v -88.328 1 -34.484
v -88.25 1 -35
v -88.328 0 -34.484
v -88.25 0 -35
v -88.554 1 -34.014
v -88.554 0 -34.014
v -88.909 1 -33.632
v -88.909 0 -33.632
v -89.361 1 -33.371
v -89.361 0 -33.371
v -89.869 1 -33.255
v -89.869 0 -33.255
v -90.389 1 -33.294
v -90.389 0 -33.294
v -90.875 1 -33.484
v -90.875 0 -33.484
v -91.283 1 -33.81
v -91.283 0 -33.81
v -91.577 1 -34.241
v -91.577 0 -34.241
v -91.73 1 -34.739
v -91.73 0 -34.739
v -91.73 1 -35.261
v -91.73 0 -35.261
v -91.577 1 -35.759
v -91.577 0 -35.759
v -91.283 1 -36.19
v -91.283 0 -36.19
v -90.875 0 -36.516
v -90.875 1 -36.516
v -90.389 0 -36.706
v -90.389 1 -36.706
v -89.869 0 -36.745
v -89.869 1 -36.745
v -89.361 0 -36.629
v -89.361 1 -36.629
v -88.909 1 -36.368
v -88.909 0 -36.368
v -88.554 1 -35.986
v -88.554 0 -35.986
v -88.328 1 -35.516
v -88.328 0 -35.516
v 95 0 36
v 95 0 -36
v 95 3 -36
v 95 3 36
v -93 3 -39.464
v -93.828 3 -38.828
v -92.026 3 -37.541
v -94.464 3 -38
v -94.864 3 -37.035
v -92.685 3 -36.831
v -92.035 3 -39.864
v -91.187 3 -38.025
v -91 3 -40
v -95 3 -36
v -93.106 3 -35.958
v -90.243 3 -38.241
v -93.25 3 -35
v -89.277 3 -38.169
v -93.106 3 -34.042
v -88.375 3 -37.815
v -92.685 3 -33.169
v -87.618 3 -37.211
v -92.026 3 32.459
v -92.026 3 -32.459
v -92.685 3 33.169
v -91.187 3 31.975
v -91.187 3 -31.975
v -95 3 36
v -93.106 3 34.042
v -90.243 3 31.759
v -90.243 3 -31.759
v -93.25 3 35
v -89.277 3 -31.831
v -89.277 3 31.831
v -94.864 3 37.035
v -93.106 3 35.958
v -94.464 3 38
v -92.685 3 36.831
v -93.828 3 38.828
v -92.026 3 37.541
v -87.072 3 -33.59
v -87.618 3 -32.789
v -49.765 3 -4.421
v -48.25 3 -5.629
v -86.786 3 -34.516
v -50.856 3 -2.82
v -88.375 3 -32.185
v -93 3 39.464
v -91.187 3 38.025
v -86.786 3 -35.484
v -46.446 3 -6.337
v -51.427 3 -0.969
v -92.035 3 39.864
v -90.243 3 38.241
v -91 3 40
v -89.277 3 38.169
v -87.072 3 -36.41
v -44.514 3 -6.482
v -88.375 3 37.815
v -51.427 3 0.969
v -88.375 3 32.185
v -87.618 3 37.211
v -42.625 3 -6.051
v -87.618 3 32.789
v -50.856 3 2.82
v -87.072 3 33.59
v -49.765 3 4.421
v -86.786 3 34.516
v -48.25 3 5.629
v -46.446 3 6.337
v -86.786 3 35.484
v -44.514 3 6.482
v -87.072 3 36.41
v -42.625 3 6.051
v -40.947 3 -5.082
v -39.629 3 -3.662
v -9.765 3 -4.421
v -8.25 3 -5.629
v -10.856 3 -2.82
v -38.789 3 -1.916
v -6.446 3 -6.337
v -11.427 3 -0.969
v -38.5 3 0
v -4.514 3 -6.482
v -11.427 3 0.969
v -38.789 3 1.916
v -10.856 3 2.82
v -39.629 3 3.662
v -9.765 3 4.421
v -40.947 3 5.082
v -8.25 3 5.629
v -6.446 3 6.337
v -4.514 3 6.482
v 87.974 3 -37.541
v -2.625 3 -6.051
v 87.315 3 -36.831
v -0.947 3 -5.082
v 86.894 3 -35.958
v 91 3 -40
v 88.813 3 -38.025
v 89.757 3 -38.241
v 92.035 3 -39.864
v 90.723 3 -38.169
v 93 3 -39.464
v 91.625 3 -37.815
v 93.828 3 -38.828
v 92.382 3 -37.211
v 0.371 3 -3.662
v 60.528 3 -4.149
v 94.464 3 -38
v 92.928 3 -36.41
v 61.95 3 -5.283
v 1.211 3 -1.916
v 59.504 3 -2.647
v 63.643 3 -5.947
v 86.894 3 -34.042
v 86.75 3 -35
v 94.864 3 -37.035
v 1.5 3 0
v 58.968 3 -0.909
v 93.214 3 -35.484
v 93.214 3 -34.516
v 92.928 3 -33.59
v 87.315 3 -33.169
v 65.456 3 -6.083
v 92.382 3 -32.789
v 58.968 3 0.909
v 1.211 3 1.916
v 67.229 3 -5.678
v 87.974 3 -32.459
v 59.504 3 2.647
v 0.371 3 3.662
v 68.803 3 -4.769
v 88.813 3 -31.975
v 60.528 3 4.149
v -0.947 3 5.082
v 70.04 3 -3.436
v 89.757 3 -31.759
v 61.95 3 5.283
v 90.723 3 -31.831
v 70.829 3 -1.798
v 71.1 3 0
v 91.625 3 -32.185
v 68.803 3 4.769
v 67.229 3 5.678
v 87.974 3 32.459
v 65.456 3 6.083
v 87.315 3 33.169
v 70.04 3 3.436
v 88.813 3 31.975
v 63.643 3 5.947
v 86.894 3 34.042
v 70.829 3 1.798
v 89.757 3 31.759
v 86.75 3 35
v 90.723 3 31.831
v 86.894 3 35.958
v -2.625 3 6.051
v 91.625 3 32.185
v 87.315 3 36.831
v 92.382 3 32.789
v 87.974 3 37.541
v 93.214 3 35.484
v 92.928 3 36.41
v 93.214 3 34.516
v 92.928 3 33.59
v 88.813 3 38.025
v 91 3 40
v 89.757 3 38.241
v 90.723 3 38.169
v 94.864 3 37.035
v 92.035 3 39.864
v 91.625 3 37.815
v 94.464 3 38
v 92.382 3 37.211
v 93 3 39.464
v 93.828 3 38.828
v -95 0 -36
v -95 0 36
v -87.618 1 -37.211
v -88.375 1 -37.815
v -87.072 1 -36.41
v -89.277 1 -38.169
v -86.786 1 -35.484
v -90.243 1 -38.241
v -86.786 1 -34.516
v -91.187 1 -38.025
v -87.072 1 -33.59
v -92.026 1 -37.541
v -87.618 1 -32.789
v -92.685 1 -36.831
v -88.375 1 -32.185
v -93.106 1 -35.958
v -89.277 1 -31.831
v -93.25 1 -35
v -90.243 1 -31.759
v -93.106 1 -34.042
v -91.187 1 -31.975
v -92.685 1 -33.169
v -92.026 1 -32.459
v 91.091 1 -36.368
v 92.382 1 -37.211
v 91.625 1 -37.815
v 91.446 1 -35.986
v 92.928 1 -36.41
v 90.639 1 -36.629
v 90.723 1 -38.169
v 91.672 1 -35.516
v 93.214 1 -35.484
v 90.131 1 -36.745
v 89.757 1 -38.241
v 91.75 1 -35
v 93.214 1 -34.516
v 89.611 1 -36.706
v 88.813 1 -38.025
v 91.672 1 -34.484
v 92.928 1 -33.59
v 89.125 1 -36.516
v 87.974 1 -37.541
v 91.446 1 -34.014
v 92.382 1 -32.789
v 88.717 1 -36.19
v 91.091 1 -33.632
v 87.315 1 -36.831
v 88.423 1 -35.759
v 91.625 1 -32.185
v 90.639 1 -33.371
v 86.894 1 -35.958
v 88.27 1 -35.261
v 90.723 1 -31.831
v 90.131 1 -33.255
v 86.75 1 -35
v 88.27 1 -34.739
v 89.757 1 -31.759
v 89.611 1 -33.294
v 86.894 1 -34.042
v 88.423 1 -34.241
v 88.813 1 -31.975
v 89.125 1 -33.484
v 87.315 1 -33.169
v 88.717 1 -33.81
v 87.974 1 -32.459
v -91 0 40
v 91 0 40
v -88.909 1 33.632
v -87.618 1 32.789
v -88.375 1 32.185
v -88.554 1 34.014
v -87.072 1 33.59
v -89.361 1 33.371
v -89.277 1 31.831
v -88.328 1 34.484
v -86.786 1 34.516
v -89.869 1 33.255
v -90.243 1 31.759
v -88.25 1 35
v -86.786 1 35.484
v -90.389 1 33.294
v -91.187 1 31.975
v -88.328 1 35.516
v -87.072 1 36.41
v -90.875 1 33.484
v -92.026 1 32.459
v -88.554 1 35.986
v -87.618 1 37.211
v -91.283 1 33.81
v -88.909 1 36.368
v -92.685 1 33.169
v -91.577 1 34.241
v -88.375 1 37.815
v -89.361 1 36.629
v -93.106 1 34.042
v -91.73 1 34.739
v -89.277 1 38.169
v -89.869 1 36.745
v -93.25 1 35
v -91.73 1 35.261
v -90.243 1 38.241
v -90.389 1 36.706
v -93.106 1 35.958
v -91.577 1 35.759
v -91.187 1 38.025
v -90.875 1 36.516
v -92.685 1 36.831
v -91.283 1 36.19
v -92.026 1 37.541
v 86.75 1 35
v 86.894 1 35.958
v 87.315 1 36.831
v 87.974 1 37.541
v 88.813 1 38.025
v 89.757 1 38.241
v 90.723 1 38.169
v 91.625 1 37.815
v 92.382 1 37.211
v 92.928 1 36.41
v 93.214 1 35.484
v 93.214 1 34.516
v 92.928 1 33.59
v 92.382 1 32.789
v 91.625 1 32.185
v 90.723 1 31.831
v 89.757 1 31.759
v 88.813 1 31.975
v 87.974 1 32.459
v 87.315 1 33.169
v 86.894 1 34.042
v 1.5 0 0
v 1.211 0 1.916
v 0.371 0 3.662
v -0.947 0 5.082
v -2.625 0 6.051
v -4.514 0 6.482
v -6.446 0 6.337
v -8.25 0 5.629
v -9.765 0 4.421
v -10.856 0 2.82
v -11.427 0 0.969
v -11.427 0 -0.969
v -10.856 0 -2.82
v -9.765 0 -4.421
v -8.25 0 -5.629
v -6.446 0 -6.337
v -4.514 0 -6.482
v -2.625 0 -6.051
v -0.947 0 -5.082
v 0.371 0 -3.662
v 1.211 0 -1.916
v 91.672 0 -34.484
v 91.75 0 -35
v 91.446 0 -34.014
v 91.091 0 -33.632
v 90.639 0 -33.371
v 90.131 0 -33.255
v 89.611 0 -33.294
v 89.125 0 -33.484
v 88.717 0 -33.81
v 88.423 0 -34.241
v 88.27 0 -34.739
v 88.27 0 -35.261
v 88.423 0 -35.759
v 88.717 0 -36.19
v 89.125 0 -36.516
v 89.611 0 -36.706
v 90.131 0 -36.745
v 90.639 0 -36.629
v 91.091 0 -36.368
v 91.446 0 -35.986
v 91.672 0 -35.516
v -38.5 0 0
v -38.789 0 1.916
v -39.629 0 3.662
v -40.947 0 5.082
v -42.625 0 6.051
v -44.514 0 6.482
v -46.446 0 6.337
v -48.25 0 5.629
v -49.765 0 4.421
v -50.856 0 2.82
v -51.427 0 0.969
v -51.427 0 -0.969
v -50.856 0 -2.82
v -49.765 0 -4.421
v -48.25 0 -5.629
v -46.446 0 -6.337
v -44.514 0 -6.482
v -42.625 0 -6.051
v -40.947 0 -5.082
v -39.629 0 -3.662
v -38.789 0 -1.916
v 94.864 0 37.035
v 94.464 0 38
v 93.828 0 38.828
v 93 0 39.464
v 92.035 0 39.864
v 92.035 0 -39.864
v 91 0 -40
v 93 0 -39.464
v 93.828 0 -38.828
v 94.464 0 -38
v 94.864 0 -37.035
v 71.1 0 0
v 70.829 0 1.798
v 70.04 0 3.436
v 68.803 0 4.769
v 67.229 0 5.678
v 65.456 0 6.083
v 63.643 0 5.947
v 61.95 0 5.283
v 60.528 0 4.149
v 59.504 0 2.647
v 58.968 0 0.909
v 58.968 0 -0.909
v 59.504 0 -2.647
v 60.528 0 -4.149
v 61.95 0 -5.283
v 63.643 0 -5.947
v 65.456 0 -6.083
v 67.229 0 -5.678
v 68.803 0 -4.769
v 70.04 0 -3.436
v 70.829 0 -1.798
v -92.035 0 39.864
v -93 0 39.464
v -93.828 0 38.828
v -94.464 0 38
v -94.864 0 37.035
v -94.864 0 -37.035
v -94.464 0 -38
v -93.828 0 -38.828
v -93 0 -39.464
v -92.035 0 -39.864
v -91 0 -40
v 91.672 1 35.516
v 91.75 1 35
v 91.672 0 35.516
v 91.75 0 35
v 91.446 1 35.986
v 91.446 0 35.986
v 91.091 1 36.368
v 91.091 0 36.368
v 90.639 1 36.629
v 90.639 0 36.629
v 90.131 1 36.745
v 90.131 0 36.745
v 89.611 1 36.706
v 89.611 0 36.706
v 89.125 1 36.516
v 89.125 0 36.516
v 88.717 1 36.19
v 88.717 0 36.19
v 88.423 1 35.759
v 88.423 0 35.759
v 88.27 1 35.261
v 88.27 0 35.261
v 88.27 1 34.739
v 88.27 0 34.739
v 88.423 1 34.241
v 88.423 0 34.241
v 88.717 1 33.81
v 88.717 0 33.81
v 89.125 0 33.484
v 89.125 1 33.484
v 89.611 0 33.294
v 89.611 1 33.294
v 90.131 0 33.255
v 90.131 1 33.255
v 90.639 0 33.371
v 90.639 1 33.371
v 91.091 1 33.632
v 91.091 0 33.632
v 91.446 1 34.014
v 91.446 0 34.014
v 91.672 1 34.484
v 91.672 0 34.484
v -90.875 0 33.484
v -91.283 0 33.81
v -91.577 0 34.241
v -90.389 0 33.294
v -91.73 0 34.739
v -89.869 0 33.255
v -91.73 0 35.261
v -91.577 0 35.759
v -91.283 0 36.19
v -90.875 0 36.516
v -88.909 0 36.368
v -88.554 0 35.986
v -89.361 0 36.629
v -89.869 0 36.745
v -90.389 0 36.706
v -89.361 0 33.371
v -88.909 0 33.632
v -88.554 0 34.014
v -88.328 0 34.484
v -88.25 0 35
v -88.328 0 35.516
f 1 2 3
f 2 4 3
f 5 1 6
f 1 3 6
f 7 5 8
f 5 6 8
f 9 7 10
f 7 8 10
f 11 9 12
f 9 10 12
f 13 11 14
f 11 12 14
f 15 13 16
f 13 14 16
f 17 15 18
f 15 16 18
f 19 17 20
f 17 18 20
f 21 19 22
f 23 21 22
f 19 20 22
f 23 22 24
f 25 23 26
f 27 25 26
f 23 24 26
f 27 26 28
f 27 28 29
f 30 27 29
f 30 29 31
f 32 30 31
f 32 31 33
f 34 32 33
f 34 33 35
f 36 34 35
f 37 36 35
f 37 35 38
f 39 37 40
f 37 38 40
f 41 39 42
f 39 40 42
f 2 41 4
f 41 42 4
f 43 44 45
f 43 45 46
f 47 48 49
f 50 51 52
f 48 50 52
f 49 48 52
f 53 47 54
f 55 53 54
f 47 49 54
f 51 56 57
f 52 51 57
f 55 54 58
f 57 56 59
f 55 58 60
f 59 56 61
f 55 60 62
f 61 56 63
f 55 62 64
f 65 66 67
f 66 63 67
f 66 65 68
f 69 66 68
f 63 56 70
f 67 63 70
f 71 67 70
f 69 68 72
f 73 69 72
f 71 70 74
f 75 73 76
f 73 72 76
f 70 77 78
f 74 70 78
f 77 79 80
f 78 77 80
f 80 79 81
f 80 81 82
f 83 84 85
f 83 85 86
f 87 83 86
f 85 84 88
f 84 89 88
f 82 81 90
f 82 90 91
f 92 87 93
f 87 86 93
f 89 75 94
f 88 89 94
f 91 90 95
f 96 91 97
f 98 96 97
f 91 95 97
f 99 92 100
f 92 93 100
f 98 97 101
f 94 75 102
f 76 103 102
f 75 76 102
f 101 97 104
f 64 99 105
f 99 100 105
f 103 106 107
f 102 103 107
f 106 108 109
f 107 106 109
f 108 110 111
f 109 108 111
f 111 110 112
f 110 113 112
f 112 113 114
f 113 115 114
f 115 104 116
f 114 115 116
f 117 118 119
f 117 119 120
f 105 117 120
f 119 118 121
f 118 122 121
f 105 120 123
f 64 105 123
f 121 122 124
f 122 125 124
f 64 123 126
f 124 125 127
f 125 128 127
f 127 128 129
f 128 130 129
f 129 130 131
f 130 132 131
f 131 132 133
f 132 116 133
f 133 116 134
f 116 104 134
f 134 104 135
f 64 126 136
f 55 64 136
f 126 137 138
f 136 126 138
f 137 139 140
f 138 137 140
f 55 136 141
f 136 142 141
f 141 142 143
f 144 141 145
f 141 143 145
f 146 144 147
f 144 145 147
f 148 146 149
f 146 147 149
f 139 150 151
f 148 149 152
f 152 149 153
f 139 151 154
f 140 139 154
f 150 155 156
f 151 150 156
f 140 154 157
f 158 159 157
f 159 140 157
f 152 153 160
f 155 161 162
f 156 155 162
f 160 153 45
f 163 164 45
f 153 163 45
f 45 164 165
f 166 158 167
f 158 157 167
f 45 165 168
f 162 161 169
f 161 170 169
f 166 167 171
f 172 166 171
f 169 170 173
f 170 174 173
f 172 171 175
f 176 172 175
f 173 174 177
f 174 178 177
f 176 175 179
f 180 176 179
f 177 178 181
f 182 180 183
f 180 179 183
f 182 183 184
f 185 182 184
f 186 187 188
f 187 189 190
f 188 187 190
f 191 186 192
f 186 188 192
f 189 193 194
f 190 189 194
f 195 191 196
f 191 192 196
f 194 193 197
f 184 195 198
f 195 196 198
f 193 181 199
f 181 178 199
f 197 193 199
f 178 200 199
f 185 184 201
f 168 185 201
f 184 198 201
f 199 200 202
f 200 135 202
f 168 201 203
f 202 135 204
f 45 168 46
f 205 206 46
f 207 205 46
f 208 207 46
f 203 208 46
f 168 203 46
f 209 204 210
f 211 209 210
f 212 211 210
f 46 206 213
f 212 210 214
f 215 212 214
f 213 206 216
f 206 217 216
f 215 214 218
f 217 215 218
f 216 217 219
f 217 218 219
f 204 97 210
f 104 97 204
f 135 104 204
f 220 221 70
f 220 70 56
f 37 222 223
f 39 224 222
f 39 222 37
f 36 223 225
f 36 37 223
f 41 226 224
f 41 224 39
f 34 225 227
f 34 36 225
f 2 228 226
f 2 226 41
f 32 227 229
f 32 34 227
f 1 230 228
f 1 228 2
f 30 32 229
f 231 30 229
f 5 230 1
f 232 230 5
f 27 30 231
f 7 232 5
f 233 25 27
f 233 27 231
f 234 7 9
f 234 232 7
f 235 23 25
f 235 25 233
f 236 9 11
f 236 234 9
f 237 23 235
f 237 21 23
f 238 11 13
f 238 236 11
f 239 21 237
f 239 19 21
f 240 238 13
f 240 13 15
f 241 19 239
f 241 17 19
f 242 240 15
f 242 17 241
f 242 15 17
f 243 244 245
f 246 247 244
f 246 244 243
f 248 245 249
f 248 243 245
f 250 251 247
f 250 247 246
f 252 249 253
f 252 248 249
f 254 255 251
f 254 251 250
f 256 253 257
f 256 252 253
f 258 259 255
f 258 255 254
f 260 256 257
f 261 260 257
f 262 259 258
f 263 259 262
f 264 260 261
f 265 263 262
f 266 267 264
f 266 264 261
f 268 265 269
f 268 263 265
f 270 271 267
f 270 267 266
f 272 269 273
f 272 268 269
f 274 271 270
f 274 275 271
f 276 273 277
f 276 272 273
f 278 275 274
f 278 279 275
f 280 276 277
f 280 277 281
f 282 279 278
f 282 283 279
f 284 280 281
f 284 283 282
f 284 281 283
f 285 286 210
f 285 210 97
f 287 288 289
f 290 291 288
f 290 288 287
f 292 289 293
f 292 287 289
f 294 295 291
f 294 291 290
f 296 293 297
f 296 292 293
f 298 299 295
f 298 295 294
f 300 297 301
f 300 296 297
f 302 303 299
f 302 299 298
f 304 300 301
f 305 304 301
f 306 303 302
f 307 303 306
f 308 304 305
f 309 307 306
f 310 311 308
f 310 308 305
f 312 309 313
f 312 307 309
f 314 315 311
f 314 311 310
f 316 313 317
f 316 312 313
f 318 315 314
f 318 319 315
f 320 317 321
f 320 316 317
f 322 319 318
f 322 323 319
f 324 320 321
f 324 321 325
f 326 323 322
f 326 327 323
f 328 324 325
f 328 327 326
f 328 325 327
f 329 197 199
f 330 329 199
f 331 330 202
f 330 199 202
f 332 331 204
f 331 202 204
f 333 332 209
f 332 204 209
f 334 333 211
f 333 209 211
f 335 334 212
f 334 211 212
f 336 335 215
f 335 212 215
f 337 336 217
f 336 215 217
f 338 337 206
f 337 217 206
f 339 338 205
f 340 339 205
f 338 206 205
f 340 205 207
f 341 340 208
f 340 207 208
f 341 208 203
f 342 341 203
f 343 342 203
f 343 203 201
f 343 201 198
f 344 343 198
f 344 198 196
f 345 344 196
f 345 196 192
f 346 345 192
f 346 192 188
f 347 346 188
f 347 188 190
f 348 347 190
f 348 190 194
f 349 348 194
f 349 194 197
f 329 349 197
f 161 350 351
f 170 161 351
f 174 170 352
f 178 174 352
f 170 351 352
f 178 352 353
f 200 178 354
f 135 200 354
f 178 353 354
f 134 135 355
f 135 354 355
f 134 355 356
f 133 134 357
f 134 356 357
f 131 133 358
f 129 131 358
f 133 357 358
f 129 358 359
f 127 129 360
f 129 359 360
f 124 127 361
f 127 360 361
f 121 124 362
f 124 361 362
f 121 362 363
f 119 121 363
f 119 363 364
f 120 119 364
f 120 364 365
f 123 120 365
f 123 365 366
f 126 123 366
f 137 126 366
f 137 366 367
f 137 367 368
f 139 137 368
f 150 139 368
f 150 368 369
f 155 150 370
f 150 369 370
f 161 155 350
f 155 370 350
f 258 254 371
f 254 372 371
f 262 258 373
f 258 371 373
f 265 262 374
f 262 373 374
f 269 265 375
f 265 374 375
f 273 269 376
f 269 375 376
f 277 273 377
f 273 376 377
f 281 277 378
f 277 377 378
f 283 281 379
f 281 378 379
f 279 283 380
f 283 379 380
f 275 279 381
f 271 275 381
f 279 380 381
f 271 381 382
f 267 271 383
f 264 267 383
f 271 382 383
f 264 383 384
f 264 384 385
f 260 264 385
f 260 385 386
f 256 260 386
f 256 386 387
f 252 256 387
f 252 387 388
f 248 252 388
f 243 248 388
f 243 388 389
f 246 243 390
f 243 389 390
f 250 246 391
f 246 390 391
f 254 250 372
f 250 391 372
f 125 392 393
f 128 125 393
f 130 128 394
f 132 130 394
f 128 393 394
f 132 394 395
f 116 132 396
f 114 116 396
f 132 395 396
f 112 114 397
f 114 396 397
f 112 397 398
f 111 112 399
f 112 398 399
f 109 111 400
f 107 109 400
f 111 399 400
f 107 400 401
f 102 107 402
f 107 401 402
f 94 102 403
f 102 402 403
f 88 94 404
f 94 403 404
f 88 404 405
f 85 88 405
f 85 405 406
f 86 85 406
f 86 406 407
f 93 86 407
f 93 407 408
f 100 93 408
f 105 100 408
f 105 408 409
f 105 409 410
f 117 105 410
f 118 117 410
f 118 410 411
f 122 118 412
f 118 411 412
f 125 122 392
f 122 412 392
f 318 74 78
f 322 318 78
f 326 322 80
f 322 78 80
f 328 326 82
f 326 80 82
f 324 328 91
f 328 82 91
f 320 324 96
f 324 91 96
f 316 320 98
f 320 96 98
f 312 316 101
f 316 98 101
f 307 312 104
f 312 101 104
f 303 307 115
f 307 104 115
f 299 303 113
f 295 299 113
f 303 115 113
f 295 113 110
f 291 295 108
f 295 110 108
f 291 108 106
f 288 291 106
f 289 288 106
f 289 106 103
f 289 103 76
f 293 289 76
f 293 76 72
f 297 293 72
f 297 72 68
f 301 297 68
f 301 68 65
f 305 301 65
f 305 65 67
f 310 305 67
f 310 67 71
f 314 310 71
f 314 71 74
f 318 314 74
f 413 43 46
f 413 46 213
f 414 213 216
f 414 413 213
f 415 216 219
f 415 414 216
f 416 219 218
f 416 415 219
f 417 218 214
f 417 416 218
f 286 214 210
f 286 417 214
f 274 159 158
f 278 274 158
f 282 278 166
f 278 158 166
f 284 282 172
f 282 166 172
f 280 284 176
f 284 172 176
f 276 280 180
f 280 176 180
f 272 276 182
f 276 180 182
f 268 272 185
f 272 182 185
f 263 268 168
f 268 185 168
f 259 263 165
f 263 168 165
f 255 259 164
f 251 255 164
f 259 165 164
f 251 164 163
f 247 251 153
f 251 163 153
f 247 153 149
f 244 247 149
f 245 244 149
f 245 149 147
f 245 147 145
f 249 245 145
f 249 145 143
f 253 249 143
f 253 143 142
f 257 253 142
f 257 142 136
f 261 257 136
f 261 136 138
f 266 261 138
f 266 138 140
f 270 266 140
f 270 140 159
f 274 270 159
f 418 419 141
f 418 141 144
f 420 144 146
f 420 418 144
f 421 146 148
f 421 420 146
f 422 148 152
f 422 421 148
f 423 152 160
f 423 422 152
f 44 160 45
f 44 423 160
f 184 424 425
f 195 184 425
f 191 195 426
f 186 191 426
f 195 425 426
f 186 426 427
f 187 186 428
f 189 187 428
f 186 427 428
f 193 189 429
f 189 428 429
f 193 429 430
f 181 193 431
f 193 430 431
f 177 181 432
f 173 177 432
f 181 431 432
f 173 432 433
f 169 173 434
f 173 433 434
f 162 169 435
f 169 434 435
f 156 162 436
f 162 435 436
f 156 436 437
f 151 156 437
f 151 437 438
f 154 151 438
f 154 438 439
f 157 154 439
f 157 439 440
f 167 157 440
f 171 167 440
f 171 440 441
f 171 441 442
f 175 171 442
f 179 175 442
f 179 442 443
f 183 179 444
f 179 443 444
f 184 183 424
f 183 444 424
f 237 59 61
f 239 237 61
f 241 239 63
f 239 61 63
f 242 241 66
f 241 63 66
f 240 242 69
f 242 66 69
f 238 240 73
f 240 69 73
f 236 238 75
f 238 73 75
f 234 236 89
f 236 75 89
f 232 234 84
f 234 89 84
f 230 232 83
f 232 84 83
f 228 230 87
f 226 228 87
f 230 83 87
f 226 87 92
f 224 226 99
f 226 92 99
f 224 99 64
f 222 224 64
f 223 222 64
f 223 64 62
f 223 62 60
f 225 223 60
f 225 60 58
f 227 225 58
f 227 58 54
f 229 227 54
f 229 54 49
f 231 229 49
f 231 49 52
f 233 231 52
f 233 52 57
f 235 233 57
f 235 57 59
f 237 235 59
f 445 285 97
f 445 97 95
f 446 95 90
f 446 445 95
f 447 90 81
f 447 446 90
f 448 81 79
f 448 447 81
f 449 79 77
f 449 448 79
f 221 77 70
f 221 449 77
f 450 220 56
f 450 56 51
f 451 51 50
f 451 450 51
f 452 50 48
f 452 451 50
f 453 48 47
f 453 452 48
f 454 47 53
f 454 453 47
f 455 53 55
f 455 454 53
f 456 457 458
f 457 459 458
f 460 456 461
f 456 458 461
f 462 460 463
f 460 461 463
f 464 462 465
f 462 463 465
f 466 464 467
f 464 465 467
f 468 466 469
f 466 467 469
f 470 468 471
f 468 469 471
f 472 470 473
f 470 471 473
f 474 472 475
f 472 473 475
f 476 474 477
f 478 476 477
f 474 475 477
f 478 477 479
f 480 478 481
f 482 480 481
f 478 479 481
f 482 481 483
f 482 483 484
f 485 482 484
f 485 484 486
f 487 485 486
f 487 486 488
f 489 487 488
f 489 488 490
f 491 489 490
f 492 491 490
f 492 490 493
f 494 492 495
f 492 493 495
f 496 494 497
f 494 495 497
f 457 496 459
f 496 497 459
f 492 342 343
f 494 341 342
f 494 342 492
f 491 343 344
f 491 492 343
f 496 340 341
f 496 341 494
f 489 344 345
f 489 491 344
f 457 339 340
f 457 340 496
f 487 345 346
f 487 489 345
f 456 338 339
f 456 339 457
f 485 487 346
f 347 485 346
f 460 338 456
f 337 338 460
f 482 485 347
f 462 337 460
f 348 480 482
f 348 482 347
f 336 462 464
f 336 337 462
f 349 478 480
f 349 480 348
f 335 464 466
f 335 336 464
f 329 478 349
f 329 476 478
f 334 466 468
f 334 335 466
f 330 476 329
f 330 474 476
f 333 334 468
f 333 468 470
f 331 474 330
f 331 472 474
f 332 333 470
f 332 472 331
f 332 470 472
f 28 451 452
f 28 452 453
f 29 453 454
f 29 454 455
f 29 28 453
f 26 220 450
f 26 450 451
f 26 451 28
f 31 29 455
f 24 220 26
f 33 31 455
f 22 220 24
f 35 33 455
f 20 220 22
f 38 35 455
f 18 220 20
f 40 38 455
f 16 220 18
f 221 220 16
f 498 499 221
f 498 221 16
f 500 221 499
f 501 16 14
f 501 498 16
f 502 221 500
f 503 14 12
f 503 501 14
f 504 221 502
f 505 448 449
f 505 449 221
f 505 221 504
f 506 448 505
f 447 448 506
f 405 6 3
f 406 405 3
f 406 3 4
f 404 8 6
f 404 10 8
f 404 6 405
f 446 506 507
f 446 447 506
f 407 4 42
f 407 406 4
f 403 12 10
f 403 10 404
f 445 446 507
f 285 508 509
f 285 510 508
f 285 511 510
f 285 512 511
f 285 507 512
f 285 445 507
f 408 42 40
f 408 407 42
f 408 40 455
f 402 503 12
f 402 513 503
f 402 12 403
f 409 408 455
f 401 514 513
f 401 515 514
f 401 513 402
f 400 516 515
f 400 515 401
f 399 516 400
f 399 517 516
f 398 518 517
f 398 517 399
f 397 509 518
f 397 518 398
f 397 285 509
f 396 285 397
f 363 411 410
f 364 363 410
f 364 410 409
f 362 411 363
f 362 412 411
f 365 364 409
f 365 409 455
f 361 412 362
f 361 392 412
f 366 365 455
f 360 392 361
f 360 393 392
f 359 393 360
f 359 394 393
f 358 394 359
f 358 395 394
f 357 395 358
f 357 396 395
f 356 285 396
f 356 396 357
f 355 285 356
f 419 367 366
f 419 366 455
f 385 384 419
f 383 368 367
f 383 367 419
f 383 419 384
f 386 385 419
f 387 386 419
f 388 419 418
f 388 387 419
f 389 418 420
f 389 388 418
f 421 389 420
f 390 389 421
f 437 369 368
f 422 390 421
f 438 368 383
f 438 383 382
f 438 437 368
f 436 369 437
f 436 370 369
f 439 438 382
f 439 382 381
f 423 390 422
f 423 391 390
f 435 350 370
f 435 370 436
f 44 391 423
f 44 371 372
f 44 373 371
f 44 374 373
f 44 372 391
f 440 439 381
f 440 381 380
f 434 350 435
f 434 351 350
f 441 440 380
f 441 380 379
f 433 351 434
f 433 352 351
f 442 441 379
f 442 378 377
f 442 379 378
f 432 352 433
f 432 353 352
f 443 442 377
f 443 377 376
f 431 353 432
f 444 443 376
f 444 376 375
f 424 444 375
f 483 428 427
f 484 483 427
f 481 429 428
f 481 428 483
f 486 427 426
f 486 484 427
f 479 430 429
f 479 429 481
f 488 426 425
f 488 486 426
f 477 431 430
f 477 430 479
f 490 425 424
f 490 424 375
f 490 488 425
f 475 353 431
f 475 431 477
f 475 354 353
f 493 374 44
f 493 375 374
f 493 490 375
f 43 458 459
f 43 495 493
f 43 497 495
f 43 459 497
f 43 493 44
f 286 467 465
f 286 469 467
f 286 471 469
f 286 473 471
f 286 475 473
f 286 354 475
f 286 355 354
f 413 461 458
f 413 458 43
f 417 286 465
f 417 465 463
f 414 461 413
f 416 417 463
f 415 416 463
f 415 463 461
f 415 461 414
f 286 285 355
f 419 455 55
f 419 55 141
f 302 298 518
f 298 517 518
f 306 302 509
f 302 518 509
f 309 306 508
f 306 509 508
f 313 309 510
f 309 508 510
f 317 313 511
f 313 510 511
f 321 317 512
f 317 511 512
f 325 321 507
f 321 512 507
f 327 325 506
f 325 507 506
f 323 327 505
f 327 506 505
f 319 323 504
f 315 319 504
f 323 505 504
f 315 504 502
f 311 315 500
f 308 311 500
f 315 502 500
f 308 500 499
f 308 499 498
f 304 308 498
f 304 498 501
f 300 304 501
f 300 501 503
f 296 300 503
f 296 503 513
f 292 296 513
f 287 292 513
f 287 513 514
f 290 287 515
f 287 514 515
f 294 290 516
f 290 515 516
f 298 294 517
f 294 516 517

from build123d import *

# Parameters (mm, degrees)
F0_R           = 6.5
F0_R_2         = 6.1
F1_DEPTH       = 3
F3_D           = 3.5
F3_CBORE_D     = 6.5
F3_CBORE_DEPTH = 2


with BuildPart() as f1:
    # F0 (on Front) → F1 (new body)
    with BuildSketch(Plane.XZ):
        with BuildLine():
            Line((-91, -40), (91, -40))
            ThreePointArc((91, -40), (93.828427, -38.828427), (95, -36))
            Line((95, -36), (95, 36))
            ThreePointArc((95, 36), (93.828427, 38.828427), (91, 40))
            Line((91, 40), (-91, 40))
            ThreePointArc((-91, 40), (-93.828427, 38.828427), (-95, 36))
            Line((-95, 36), (-95, -36))
            ThreePointArc((-95, -36), (-93.828427, -38.828427), (-91, -40))
        make_face()
        with Locations((-45, 0)):
            Circle(F0_R, mode=Mode.SUBTRACT)
        with Locations((-5, 0)):
            Circle(F0_R, mode=Mode.SUBTRACT)
        with Locations((65, 0)):
            Circle(F0_R_2, mode=Mode.SUBTRACT)
    extrude(amount=-F1_DEPTH)

    # F3 (through all)
    with Locations(Plane(origin=(0, 3, 0), x_dir=(-1, 0, 0), z_dir=(0, 1, 0))):
        with Locations((-90, 35), (90, 35), (90, -35), (-90, -35)):
            CounterBoreHole(F3_D / 2, F3_CBORE_D / 2, F3_CBORE_DEPTH)


solid = f1.part
